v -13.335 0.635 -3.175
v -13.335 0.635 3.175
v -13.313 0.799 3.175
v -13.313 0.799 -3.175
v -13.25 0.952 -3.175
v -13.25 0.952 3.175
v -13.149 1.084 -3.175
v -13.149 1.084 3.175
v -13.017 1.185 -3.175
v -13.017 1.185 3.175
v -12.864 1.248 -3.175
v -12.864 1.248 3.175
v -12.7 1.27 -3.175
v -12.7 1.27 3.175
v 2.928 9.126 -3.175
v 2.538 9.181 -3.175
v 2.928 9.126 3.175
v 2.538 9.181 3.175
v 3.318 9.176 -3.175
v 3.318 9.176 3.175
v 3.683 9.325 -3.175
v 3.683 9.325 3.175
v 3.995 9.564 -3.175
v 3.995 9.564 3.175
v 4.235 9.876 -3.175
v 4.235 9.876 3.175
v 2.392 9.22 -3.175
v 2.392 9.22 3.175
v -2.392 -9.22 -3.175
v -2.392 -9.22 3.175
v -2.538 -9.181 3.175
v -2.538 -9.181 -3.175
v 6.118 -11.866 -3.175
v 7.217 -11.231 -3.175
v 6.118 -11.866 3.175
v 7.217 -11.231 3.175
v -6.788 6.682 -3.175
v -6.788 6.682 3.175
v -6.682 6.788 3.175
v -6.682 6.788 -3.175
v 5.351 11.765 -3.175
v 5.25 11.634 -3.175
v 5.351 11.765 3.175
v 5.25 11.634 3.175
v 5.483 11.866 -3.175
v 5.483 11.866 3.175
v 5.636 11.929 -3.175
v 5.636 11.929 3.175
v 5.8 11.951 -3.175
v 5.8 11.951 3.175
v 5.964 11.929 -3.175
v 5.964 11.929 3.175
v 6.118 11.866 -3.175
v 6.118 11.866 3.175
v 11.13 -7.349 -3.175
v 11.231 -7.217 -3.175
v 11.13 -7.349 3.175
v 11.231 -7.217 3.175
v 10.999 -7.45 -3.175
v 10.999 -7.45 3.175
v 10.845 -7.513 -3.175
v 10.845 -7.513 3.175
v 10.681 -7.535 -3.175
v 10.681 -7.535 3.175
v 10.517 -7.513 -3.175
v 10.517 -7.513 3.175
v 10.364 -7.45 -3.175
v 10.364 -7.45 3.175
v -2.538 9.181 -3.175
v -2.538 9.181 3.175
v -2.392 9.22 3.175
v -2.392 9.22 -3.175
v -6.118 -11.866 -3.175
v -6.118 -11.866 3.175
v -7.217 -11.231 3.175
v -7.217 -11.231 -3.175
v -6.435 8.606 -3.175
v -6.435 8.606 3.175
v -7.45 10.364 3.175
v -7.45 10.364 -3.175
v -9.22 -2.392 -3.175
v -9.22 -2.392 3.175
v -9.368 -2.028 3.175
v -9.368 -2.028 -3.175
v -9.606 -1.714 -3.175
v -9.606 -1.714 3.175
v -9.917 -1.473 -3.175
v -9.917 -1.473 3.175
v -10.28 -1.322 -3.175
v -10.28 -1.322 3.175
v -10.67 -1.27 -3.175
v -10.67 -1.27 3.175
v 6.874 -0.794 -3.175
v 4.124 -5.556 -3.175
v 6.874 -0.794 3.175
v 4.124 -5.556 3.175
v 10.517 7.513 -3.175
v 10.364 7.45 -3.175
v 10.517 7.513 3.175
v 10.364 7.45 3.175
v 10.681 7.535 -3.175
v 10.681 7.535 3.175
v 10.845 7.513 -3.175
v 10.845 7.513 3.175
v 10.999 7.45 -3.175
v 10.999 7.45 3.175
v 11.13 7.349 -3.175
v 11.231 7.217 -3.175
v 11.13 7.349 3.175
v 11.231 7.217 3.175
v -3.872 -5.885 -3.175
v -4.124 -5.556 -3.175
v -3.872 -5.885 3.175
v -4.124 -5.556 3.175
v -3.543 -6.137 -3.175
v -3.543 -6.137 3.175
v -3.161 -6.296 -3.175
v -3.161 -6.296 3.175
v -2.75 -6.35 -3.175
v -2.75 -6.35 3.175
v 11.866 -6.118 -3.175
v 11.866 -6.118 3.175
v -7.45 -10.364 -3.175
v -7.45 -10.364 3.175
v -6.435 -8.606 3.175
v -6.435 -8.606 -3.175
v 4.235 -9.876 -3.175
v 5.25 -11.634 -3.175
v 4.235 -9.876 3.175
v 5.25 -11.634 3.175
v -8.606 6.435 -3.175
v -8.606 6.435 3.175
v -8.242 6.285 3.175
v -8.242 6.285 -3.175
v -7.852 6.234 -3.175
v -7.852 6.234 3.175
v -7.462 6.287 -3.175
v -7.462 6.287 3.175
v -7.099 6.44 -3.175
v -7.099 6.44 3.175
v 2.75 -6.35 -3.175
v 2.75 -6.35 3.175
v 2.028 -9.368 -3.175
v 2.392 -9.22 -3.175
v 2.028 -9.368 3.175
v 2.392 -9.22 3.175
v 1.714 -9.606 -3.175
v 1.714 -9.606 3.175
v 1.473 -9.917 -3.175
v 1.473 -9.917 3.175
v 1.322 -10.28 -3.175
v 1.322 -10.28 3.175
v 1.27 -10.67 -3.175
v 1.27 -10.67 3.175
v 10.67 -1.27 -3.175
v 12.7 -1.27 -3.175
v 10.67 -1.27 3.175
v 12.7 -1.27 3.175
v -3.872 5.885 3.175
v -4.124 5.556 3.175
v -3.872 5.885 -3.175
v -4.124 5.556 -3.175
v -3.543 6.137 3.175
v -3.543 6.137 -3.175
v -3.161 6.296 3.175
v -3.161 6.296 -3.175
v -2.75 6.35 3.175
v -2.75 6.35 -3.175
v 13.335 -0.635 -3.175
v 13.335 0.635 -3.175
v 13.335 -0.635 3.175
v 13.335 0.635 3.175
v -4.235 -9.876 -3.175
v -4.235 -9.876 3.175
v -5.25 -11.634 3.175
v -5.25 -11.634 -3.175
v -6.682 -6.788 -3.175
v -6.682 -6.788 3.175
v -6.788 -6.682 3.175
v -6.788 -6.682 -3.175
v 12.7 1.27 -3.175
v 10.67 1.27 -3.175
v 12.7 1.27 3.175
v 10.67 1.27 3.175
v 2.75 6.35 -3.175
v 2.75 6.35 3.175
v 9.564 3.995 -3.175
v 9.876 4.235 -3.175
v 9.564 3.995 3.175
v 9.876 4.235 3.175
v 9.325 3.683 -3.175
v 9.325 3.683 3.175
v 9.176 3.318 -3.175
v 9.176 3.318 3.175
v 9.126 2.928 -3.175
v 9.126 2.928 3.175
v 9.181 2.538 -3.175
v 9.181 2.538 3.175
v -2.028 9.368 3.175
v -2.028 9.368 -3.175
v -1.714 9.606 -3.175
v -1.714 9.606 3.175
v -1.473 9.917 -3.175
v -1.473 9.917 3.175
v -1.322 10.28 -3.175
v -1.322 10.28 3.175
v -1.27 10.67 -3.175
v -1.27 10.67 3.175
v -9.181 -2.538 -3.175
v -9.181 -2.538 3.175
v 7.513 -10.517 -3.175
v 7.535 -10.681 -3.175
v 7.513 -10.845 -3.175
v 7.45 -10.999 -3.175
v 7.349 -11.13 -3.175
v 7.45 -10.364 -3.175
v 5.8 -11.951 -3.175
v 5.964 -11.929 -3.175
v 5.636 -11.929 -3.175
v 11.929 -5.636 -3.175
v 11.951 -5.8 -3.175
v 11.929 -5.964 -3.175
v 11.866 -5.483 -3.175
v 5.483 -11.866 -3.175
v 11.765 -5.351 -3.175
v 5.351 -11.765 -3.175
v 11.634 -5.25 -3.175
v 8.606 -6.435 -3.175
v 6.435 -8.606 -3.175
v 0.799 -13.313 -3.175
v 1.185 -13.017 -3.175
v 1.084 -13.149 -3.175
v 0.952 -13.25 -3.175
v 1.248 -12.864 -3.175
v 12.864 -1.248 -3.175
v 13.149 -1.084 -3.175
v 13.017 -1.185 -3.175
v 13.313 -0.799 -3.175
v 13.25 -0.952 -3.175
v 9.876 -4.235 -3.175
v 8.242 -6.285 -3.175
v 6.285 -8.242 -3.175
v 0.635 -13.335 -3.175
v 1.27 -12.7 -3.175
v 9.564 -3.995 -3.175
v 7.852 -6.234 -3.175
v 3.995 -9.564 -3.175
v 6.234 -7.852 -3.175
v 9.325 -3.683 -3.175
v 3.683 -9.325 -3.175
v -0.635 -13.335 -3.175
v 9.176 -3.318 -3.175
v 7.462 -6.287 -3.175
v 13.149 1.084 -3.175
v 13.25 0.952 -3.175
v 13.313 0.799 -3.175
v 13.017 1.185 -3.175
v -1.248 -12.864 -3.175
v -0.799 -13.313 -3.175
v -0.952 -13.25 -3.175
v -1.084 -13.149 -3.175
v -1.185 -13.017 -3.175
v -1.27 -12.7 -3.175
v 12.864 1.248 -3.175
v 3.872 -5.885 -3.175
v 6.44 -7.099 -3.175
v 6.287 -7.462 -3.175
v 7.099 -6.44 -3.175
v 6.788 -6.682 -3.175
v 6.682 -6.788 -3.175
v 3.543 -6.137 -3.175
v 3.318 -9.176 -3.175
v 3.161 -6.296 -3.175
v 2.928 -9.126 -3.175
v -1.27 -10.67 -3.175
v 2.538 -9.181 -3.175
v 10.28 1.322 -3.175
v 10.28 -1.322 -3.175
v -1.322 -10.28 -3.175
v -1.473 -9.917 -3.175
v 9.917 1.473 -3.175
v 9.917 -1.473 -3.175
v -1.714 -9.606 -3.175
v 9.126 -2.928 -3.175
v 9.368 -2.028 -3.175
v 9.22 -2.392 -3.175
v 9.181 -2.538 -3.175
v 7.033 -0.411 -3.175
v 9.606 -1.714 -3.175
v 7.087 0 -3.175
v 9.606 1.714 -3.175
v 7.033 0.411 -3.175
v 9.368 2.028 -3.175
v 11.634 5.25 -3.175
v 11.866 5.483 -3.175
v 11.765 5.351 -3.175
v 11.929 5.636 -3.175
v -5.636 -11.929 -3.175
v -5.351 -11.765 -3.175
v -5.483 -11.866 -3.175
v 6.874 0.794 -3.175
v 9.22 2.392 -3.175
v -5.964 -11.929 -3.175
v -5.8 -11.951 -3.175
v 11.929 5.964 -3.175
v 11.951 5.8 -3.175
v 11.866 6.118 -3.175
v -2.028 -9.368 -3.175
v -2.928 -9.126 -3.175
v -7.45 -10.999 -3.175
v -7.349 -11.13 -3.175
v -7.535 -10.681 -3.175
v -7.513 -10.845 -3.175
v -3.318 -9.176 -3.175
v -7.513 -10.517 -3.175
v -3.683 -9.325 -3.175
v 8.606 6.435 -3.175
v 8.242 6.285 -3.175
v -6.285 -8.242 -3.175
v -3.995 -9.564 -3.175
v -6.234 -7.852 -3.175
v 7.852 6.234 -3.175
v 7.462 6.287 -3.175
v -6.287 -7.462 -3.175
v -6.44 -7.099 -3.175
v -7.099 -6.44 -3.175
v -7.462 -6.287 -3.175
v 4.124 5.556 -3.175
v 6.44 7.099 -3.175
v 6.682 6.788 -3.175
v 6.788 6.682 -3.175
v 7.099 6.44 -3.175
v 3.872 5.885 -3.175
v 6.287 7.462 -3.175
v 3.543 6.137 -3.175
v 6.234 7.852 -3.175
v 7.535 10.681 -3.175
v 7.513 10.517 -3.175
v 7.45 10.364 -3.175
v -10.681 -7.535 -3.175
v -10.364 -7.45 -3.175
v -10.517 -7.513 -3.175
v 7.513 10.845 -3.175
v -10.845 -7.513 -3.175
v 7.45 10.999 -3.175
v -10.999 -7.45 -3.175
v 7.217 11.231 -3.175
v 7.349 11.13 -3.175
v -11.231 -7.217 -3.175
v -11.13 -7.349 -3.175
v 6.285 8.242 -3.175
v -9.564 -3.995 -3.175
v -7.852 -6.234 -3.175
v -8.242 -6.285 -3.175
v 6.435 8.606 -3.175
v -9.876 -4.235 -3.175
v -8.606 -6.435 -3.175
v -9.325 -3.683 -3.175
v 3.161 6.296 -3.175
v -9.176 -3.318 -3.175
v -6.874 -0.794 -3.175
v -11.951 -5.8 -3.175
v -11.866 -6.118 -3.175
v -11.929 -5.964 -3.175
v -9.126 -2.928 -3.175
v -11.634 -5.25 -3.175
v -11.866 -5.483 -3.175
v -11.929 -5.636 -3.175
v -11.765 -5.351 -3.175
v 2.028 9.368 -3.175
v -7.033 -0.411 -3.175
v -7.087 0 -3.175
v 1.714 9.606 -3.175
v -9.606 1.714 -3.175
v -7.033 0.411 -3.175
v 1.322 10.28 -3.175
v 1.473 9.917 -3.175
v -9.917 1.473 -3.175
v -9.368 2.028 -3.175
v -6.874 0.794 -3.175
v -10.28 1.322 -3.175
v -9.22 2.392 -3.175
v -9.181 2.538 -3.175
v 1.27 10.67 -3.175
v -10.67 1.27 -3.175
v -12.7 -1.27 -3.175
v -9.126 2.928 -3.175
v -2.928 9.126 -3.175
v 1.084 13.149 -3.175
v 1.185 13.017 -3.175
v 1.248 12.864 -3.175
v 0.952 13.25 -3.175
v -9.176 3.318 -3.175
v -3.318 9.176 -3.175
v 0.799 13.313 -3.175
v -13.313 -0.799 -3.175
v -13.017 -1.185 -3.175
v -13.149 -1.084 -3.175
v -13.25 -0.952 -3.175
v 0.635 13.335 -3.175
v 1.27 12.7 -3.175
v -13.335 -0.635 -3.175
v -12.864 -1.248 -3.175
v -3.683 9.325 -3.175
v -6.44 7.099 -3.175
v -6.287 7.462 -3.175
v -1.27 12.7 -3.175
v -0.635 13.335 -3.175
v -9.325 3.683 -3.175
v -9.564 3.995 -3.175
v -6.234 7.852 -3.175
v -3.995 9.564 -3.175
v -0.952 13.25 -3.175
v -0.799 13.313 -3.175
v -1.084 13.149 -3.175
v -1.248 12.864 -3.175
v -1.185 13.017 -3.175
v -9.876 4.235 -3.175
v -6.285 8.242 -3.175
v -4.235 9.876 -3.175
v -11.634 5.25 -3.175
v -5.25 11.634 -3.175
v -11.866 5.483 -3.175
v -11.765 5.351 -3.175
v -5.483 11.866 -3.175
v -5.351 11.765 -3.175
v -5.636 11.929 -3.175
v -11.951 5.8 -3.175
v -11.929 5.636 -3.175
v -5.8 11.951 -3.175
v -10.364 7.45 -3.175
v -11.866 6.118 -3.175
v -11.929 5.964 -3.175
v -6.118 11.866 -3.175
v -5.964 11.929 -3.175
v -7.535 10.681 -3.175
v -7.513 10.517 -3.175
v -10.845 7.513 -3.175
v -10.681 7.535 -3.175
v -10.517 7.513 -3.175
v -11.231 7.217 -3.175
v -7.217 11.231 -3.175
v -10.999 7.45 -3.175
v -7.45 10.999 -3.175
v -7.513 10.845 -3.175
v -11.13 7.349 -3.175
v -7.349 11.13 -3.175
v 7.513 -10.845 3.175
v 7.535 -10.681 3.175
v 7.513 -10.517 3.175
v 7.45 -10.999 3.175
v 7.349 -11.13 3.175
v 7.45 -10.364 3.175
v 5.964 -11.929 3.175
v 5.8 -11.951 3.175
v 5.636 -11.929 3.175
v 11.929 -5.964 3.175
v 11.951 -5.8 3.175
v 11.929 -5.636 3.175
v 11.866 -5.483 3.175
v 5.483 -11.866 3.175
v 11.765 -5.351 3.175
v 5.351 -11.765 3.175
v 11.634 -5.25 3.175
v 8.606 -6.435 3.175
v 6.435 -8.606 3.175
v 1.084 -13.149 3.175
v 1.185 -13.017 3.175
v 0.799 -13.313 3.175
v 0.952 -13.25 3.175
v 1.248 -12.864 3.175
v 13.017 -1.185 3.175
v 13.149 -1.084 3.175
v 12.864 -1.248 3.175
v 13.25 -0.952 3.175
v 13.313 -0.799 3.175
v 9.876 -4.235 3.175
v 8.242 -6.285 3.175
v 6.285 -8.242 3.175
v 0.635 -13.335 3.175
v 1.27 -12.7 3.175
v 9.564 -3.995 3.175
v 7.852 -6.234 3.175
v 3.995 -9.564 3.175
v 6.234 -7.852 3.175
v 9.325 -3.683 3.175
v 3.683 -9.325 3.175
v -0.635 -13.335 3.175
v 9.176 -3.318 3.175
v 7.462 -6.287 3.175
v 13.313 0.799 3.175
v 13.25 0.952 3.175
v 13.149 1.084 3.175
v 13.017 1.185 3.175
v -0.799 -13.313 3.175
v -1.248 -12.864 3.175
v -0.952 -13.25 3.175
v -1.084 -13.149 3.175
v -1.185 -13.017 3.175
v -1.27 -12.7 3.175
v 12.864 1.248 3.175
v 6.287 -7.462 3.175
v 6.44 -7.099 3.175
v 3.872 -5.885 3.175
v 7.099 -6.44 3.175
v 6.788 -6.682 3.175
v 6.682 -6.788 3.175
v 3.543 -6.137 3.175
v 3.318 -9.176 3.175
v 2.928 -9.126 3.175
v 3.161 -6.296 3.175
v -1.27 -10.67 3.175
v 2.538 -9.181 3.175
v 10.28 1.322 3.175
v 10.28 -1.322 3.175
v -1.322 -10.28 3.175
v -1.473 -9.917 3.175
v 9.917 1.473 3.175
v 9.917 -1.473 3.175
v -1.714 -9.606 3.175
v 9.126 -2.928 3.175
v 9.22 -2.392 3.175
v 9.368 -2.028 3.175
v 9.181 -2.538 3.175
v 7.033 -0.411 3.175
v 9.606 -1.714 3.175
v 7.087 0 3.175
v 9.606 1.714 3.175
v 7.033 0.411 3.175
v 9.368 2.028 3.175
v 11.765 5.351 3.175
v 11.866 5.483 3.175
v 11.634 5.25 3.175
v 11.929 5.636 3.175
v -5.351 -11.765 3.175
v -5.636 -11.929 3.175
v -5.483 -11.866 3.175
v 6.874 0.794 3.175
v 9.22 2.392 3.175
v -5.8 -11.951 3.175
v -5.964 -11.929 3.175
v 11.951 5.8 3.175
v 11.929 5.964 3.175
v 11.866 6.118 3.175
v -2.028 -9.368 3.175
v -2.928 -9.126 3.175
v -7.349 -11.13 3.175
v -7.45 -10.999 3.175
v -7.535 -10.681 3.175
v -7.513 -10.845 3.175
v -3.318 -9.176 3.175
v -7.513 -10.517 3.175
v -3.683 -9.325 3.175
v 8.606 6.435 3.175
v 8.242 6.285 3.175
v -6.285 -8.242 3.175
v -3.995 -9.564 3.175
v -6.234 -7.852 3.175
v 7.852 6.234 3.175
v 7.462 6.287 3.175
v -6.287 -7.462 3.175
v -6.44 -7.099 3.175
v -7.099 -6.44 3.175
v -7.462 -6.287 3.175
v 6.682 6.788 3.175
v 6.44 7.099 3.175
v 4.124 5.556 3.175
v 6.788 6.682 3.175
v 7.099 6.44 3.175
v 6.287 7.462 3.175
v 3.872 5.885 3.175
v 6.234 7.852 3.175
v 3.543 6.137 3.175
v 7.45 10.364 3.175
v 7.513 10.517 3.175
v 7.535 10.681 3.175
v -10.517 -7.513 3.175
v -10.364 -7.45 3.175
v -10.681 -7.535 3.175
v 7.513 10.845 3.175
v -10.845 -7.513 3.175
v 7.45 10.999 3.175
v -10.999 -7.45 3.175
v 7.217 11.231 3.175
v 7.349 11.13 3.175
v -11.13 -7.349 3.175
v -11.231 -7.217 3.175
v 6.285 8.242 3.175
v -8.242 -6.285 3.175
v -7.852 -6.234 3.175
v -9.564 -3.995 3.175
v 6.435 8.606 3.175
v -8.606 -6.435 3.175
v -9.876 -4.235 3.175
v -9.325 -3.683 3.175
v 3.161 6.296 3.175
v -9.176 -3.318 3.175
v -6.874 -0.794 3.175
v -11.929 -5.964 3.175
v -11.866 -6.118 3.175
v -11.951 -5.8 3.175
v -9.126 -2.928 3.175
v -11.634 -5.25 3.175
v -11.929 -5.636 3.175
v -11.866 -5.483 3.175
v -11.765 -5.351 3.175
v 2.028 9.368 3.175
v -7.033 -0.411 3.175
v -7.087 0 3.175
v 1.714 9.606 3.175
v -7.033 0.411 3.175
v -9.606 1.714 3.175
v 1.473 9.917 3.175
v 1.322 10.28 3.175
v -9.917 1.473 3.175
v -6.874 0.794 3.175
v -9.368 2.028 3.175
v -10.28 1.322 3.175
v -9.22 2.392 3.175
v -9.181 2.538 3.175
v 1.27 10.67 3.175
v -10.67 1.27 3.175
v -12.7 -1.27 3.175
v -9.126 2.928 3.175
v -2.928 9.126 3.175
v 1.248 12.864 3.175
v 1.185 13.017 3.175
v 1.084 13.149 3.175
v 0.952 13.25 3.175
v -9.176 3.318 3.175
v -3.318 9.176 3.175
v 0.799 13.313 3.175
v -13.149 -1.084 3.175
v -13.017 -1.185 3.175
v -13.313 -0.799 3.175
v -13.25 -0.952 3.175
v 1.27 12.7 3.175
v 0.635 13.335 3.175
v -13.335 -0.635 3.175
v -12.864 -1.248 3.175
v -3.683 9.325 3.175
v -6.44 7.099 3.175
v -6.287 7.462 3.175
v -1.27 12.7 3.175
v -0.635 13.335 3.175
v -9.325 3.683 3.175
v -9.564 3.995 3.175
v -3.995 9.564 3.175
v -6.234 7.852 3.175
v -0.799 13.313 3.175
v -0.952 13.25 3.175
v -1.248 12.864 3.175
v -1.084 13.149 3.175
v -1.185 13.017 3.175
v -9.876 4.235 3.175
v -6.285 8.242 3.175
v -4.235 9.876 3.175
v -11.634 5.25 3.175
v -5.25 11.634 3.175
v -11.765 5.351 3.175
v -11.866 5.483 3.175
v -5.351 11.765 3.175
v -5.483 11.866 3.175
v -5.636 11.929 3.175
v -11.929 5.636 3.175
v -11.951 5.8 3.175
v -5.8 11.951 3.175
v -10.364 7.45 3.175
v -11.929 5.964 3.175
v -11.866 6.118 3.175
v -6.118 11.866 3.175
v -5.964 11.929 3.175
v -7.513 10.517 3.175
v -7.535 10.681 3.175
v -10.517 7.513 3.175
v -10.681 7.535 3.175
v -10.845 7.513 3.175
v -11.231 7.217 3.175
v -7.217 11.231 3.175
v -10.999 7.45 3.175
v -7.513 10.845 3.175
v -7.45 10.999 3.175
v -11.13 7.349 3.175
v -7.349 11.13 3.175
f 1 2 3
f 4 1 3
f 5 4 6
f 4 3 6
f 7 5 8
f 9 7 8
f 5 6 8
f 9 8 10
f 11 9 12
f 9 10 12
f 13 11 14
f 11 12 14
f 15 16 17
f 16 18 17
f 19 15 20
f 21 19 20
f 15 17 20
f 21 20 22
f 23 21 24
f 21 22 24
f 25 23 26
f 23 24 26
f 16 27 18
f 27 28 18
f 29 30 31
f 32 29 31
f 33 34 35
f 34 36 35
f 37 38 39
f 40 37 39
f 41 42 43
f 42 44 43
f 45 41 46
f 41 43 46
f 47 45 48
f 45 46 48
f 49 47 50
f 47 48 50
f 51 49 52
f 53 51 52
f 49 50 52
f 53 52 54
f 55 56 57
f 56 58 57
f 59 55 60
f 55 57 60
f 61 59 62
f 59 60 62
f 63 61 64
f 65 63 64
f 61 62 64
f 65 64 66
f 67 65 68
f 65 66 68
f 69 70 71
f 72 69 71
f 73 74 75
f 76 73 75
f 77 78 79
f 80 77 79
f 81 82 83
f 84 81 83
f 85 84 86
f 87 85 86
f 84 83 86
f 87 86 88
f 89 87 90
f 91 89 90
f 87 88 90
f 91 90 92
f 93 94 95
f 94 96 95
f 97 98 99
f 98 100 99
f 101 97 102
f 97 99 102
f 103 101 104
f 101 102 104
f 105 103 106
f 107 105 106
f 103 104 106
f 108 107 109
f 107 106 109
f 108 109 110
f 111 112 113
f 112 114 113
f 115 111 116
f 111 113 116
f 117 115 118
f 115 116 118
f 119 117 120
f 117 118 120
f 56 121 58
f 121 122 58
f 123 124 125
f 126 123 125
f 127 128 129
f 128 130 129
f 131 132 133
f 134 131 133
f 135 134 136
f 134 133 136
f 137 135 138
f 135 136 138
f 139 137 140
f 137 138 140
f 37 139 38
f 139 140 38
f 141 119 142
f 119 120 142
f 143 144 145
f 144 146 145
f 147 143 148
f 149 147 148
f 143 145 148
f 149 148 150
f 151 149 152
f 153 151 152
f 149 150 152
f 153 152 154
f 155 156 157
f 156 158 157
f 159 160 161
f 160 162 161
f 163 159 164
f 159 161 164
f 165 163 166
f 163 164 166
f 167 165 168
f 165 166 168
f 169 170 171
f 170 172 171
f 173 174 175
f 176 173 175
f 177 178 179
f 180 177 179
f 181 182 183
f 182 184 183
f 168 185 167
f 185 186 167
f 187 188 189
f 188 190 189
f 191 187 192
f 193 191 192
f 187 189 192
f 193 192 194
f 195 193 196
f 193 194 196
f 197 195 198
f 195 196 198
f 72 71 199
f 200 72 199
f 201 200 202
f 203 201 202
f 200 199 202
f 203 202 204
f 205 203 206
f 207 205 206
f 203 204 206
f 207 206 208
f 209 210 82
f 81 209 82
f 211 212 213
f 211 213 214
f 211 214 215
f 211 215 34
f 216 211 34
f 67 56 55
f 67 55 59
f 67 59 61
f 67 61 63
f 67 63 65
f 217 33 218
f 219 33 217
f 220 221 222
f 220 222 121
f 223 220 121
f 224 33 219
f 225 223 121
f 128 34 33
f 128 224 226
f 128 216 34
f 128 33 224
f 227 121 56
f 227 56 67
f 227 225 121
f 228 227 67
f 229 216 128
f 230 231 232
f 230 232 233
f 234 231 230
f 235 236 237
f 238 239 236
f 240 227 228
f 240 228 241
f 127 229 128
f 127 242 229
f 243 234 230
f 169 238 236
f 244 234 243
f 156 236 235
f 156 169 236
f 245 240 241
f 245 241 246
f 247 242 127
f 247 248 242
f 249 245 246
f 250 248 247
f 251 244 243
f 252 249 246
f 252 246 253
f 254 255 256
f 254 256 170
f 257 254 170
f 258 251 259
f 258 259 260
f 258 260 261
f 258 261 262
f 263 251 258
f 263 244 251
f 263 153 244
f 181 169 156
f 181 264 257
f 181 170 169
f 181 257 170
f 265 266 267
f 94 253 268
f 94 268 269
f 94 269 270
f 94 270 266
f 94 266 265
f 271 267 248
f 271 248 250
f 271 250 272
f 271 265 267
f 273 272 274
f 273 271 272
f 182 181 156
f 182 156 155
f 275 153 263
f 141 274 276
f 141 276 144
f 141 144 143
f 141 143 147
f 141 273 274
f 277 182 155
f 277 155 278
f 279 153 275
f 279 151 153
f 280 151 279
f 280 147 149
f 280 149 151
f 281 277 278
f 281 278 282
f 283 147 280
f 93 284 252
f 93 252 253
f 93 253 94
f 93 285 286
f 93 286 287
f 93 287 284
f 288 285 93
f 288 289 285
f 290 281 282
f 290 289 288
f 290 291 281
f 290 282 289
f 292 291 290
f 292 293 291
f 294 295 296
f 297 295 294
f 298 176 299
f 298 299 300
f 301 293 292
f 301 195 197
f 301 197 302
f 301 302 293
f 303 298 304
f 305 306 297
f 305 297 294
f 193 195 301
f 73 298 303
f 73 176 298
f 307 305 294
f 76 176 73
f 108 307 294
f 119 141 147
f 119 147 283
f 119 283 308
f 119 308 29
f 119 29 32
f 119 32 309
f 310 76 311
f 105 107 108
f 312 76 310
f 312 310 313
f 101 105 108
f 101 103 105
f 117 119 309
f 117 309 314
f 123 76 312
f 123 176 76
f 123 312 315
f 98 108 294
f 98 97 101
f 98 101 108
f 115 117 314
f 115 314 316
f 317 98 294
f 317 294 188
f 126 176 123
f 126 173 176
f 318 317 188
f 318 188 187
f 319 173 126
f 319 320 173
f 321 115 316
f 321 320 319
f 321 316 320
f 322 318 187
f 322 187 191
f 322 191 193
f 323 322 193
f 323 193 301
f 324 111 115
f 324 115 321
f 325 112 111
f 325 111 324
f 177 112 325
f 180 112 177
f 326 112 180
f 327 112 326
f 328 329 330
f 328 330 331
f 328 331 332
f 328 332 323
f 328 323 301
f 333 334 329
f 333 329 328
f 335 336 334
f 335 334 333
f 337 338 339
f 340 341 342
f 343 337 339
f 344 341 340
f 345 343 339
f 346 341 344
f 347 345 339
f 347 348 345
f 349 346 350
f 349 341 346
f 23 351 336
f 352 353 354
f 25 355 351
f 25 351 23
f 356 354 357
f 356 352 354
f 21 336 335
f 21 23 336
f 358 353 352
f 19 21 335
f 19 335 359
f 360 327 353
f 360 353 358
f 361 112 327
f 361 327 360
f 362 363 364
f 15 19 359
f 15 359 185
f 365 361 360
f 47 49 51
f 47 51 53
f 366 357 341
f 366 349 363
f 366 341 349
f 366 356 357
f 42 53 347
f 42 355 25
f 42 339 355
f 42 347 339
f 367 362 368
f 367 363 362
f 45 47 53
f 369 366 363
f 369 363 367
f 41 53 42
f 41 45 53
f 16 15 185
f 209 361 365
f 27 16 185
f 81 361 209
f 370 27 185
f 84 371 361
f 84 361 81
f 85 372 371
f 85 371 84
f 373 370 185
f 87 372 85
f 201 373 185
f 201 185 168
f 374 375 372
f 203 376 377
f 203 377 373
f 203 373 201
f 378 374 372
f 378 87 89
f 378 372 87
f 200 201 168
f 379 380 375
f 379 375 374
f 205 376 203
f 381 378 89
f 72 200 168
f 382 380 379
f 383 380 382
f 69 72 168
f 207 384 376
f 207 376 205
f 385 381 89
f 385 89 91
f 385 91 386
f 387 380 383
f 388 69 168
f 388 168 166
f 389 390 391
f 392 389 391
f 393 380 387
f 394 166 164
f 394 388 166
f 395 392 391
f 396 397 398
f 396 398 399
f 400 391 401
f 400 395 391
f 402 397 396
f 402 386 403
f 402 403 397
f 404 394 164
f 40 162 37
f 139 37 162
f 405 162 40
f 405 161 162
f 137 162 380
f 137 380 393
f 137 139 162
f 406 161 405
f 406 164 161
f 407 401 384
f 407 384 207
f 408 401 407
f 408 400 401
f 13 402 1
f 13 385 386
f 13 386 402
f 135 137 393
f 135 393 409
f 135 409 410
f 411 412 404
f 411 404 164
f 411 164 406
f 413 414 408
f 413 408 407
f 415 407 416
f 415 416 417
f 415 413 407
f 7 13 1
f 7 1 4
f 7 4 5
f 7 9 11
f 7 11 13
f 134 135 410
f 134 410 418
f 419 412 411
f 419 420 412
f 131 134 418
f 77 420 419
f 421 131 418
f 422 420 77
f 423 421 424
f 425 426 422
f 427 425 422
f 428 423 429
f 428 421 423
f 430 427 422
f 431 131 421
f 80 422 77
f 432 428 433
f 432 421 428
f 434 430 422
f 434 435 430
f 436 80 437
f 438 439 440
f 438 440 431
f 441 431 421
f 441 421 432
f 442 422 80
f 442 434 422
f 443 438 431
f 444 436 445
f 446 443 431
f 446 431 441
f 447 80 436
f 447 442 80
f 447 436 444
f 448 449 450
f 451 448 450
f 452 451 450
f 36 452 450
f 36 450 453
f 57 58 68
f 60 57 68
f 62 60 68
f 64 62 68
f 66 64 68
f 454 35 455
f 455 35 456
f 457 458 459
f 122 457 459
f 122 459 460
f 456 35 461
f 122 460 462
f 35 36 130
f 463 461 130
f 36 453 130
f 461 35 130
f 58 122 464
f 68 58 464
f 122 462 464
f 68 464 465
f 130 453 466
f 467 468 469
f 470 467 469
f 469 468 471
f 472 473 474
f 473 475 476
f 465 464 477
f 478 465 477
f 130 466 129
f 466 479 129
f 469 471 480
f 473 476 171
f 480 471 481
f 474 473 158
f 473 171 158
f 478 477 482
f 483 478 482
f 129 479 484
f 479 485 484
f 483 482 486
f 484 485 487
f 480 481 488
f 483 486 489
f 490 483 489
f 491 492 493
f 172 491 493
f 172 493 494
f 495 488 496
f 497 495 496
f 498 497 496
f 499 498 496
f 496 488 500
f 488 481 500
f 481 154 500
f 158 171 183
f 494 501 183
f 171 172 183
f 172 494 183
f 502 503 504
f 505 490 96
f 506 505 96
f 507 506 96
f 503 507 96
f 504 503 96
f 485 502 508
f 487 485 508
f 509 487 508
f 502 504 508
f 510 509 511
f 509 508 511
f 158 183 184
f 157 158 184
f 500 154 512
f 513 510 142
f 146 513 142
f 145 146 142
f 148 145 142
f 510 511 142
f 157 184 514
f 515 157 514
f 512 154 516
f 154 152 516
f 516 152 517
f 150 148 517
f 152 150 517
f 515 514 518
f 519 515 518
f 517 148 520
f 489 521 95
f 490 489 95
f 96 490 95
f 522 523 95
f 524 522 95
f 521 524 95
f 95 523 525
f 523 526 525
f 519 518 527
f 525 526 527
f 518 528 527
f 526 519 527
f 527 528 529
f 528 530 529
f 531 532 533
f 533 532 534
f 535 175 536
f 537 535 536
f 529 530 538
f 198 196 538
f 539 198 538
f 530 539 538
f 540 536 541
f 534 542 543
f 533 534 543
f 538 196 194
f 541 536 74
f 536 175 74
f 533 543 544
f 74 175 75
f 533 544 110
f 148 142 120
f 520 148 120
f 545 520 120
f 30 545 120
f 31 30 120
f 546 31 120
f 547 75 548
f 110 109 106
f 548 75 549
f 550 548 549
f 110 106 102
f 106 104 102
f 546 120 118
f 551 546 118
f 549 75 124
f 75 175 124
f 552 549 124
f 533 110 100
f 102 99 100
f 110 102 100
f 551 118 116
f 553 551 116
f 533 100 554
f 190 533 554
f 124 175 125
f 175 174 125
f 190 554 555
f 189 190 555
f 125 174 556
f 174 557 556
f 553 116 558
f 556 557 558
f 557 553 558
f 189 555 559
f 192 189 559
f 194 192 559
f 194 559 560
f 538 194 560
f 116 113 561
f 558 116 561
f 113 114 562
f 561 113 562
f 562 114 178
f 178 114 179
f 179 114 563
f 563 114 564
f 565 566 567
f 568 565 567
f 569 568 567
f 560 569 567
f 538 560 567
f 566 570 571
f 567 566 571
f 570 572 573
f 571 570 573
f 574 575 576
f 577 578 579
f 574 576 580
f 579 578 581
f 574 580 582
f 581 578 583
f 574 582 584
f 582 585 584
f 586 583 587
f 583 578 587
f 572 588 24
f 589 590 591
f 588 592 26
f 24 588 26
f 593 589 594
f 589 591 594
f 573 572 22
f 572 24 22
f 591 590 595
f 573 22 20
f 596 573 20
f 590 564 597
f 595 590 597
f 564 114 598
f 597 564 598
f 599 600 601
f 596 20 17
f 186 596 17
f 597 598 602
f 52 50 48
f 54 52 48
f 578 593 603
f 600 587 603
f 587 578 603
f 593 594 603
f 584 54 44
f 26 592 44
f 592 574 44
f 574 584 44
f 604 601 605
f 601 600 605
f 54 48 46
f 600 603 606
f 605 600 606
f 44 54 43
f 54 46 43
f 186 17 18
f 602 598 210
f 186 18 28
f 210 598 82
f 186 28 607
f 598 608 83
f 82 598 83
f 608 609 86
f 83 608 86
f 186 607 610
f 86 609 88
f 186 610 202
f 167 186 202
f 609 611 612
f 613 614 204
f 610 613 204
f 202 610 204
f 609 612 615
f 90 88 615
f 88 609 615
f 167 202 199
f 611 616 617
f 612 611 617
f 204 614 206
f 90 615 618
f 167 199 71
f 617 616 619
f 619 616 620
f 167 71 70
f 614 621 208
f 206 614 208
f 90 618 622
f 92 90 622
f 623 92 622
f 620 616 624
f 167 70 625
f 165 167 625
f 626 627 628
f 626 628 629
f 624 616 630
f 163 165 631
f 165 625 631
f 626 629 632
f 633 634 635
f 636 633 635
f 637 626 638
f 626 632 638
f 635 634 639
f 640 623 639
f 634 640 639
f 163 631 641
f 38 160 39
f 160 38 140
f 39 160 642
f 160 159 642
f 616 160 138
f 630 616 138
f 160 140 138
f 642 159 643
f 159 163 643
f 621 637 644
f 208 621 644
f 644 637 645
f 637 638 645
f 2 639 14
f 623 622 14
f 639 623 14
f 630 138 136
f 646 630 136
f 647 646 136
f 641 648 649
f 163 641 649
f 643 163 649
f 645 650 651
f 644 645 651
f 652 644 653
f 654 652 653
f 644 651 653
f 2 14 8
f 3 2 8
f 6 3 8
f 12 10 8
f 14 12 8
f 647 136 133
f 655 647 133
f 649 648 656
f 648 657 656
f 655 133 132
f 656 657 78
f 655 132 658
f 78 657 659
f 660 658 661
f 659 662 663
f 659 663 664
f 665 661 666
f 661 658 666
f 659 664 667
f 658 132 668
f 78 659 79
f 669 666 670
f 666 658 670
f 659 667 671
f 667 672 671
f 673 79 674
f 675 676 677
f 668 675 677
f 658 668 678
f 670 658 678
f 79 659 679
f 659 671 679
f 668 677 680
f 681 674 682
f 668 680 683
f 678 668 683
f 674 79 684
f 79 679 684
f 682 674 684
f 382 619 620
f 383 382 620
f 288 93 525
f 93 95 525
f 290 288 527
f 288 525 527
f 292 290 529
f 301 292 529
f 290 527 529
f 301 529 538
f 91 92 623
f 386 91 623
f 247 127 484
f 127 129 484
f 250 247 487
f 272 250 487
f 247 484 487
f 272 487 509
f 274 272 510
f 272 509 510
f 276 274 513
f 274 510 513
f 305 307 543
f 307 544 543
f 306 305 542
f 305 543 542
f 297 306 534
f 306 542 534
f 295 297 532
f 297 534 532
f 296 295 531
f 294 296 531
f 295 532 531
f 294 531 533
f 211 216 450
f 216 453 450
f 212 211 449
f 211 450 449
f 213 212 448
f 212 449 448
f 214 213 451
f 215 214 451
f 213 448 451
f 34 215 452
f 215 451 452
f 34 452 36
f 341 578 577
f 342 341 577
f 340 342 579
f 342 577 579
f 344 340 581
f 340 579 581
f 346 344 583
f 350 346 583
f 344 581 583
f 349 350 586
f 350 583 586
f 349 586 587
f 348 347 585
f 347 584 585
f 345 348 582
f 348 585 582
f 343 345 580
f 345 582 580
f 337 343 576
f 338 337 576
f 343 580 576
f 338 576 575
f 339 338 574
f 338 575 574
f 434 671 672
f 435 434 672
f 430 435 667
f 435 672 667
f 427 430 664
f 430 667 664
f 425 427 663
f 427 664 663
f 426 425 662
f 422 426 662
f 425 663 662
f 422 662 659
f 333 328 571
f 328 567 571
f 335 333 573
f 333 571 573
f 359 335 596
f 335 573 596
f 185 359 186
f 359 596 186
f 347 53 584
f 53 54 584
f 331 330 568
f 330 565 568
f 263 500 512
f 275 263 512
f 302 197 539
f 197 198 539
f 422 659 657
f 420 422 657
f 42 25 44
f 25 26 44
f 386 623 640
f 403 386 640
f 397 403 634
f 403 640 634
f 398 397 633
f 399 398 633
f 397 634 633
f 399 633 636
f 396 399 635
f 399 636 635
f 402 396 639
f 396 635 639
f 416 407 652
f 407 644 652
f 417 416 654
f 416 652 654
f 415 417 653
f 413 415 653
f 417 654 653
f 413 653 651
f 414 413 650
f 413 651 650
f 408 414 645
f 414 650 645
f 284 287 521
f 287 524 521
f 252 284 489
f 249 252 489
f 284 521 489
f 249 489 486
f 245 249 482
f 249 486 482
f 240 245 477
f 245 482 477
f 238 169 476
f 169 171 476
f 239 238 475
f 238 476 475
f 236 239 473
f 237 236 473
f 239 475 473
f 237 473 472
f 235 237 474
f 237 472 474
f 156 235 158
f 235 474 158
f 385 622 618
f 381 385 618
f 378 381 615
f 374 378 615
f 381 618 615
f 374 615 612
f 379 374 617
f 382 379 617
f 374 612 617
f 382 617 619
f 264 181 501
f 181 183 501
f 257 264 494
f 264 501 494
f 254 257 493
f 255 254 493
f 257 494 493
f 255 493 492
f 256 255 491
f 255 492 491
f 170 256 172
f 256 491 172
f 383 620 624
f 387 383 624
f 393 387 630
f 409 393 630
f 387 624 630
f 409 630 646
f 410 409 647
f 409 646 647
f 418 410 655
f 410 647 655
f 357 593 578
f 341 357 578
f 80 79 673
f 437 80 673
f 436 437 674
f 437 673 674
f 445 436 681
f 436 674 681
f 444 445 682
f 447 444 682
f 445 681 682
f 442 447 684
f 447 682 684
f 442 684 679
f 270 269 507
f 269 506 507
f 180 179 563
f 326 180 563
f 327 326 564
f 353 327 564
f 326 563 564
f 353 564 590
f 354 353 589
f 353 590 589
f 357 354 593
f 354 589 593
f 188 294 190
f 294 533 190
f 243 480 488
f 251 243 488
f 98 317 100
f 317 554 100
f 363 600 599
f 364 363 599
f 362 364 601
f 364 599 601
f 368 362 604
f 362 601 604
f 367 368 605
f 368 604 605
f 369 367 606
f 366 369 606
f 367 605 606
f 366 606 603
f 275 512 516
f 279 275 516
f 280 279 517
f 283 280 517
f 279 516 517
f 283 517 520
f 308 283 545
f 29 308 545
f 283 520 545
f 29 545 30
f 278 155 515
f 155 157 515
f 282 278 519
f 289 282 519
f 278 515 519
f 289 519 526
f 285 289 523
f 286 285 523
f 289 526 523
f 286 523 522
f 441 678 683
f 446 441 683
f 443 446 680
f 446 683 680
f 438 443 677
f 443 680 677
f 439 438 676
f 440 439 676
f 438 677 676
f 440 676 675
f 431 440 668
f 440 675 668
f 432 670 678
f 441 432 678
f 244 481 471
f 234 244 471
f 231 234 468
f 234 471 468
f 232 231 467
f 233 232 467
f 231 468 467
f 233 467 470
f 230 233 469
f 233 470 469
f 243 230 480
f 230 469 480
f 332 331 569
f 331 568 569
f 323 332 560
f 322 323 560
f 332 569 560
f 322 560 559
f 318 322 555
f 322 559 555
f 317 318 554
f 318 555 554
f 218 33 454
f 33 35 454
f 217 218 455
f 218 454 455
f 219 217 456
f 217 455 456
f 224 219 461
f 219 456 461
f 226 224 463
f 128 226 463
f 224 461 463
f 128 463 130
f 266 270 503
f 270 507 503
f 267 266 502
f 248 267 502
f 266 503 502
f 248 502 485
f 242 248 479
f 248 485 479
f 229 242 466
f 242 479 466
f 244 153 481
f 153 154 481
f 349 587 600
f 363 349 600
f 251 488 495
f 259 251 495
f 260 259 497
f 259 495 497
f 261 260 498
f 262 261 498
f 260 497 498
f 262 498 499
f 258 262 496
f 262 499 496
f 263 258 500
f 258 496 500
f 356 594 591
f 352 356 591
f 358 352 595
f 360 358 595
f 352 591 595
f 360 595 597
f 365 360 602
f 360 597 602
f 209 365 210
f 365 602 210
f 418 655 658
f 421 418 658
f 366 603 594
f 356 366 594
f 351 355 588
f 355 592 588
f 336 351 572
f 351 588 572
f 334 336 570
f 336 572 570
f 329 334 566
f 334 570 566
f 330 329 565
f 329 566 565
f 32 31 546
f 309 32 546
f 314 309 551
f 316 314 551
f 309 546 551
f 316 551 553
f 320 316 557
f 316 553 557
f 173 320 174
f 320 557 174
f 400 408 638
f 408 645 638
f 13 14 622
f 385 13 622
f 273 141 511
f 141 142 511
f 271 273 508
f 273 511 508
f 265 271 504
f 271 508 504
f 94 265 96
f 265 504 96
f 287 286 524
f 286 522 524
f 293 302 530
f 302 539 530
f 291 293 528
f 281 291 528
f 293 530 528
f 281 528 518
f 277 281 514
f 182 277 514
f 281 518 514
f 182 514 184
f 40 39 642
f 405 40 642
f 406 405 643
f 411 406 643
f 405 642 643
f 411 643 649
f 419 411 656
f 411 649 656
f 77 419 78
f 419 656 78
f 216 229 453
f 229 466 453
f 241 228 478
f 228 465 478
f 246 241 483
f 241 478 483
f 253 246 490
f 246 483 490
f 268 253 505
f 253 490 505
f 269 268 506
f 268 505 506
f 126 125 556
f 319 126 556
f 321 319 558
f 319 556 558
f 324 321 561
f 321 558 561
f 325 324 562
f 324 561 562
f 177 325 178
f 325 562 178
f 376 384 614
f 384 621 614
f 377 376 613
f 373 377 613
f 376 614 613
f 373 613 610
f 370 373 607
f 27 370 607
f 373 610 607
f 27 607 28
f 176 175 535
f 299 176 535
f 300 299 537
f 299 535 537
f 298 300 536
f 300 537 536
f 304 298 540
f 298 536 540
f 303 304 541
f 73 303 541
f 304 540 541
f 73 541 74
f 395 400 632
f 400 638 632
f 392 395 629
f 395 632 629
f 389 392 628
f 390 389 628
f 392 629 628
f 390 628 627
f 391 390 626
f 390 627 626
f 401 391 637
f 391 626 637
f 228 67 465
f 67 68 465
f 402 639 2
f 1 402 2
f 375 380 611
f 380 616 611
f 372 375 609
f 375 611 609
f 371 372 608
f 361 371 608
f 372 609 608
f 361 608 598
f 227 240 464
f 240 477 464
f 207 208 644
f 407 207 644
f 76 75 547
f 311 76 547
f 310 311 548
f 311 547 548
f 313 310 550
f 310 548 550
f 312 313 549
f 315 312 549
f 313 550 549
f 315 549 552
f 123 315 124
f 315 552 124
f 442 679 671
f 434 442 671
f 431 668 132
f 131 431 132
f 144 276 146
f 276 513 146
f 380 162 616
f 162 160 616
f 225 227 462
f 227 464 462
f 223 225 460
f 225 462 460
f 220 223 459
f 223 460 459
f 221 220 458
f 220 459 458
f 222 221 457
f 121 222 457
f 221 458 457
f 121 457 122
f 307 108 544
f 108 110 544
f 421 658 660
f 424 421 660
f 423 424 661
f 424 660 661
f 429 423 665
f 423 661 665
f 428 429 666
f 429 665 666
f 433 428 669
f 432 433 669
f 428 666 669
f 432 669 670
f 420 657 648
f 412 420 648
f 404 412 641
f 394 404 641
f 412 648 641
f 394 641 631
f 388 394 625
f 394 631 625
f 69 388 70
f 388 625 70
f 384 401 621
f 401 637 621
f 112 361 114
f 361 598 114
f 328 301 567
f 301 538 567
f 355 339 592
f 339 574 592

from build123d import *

# Parameters (mm, degrees)
BOSS_EXTRUDE1_DEPTH = 3.175
FILLET1_R           = 1.5875


with BuildPart() as part:
    # Sketch1 → Boss-Extrude1 (new, symmetric)
    with BuildSketch(Plane.XY):
        with BuildLine():
            Line((-1.27, 10.670267616), (-1.27, 12.7))
            ThreePointArc((-1.27, 12.7), (-1.084012806, 13.149012806), (-0.635, 13.335))
            Line((-0.635, 13.335), (0.635, 13.335))
            ThreePointArc((0.635, 13.335), (1.084012806, 13.149012806), (1.27, 12.7))
            Line((1.27, 12.7), (1.27, 10.670267616))
            ThreePointArc((1.27, 10.670267616), (1.583306834, 9.753271395), (2.392223502, 9.219701281))
            Line((2.392223502, 9.219701281), (2.538124316, 9.180607276))
            ThreePointArc((2.538124316, 9.180607276), (3.505451757, 9.238234215), (4.235281545, 9.875722821))
            Line((4.235281545, 9.875722821), (5.250147737, 11.633522628))
            ThreePointArc((5.250147737, 11.633522628), (5.635723775, 11.929385528), (6.117573869, 11.865948759))
            Line((6.117573869, 11.865948759), (7.217426131, 11.230948759))
            ThreePointArc((7.217426131, 11.230948759), (7.513289031, 10.845372722), (7.449852263, 10.363522628))
            Line((7.449852263, 10.363522628), (6.434986071, 8.605722821))
            ThreePointArc((6.434986071, 8.605722821), (6.247819637, 7.654927381), (6.681576965, 6.788383774))
            Line((6.681576965, 6.788383774), (6.788383774, 6.681576965))
            ThreePointArc((6.788383774, 6.681576965), (7.654927381, 6.247819637), (8.605722821, 6.434986071))
            Line((8.605722821, 6.434986071), (10.363522628, 7.449852263))
            ThreePointArc((10.363522628, 7.449852263), (10.845372722, 7.513289031), (11.230948759, 7.217426131))
            Line((11.230948759, 7.217426131), (11.865948759, 6.117573869))
            ThreePointArc((11.865948759, 6.117573869), (11.929385528, 5.635723775), (11.633522628, 5.250147737))
            Line((11.633522628, 5.250147737), (9.875722821, 4.235281545))
            ThreePointArc((9.875722821, 4.235281545), (9.238234215, 3.505451757), (9.180607276, 2.538124316))
            Line((9.180607276, 2.538124316), (9.219701281, 2.392223502))
            ThreePointArc((9.219701281, 2.392223502), (9.753271395, 1.583306834), (10.670267616, 1.27))
            Line((10.670267616, 1.27), (12.7, 1.27))
            ThreePointArc((12.7, 1.27), (13.149012806, 1.084012806), (13.335, 0.635))
            Line((13.335, 0.635), (13.335, -0.635))
            ThreePointArc((13.335, -0.635), (13.149012806, -1.084012806), (12.7, -1.27))
            Line((12.7, -1.27), (10.670267616, -1.27))
            ThreePointArc((10.670267616, -1.27), (9.753271395, -1.583306834), (9.219701281, -2.392223502))
            Line((9.219701281, -2.392223502), (9.180607276, -2.538124316))
            ThreePointArc((9.180607276, -2.538124316), (9.238234215, -3.505451757), (9.875722821, -4.235281545))
            Line((9.875722821, -4.235281545), (11.633522628, -5.250147737))
            ThreePointArc((11.633522628, -5.250147737), (11.929385528, -5.635723775), (11.865948759, -6.117573869))
            Line((11.865948759, -6.117573869), (11.230948759, -7.217426131))
            ThreePointArc((11.230948759, -7.217426131), (10.845372722, -7.513289031), (10.363522628, -7.449852263))
            Line((10.363522628, -7.449852263), (8.605722821, -6.434986071))
            ThreePointArc((8.605722821, -6.434986071), (7.654927381, -6.247819637), (6.788383774, -6.681576965))
            Line((6.788383774, -6.681576965), (6.681576965, -6.788383774))
            ThreePointArc((6.681576965, -6.788383774), (6.247819637, -7.654927381), (6.434986071, -8.605722821))
            Line((6.434986071, -8.605722821), (7.449852263, -10.363522628))
            ThreePointArc((7.449852263, -10.363522628), (7.513289031, -10.845372722), (7.217426131, -11.230948759))
            Line((7.217426131, -11.230948759), (6.117573869, -11.865948759))
            ThreePointArc((6.117573869, -11.865948759), (5.635723775, -11.929385528), (5.250147737, -11.633522628))
            Line((5.250147737, -11.633522628), (4.235281545, -9.875722821))
            ThreePointArc((4.235281545, -9.875722821), (3.505451757, -9.238234215), (2.538124316, -9.180607276))
            Line((2.538124316, -9.180607276), (2.392223502, -9.219701281))
            ThreePointArc((2.392223502, -9.219701281), (1.583306834, -9.753271395), (1.27, -10.670267616))
            Line((1.27, -10.670267616), (1.27, -12.7))
            ThreePointArc((1.27, -12.7), (1.084012806, -13.149012806), (0.635, -13.335))
            Line((0.635, -13.335), (-0.635, -13.335))
            ThreePointArc((-0.635, -13.335), (-1.084012806, -13.149012806), (-1.27, -12.7))
            Line((-1.27, -12.7), (-1.27, -10.670267616))
            ThreePointArc((-1.27, -10.670267616), (-1.583306834, -9.753271395), (-2.392223502, -9.219701281))
            Line((-2.392223502, -9.219701281), (-2.538124316, -9.180607276))
            ThreePointArc((-2.538124316, -9.180607276), (-3.505451757, -9.238234215), (-4.235281545, -9.875722821))
            Line((-4.235281545, -9.875722821), (-5.250147737, -11.633522628))
            ThreePointArc((-5.250147737, -11.633522628), (-5.635723775, -11.929385528), (-6.117573869, -11.865948759))
            Line((-6.117573869, -11.865948759), (-7.217426131, -11.230948759))
            ThreePointArc((-7.217426131, -11.230948759), (-7.513289031, -10.845372722), (-7.449852263, -10.363522628))
            Line((-7.449852263, -10.363522628), (-6.434986071, -8.605722821))
            ThreePointArc((-6.434986071, -8.605722821), (-6.247819637, -7.654927381), (-6.681576965, -6.788383774))
            Line((-6.681576965, -6.788383774), (-6.788383774, -6.681576965))
            ThreePointArc((-6.788383774, -6.681576965), (-7.654927381, -6.247819637), (-8.605722821, -6.434986071))
            Line((-8.605722821, -6.434986071), (-10.363522628, -7.449852263))
            ThreePointArc((-10.363522628, -7.449852263), (-10.845372722, -7.513289031), (-11.230948759, -7.217426131))
            Line((-11.230948759, -7.217426131), (-11.865948759, -6.117573869))
            ThreePointArc((-11.865948759, -6.117573869), (-11.929385528, -5.635723775), (-11.633522628, -5.250147737))
            Line((-11.633522628, -5.250147737), (-9.875722821, -4.235281545))
            ThreePointArc((-9.875722821, -4.235281545), (-9.238234215, -3.505451757), (-9.180607276, -2.538124316))
            Line((-9.180607276, -2.538124316), (-9.219701281, -2.392223502))
            ThreePointArc((-9.219701281, -2.392223502), (-9.753271395, -1.583306834), (-10.670267616, -1.27))
            Line((-10.670267616, -1.27), (-12.7, -1.27))
            ThreePointArc((-12.7, -1.27), (-13.149012806, -1.084012806), (-13.335, -0.635))
            Line((-13.335, -0.635), (-13.335, 0.635))
            ThreePointArc((-13.335, 0.635), (-13.149012806, 1.084012806), (-12.7, 1.27))
            Line((-12.7, 1.27), (-10.670267616, 1.27))
            ThreePointArc((-10.670267616, 1.27), (-9.753271395, 1.583306834), (-9.219701281, 2.392223502))
            Line((-9.219701281, 2.392223502), (-9.180607276, 2.538124316))
            ThreePointArc((-9.180607276, 2.538124316), (-9.238234215, 3.505451757), (-9.875722821, 4.235281545))
            Line((-9.875722821, 4.235281545), (-11.633522628, 5.250147737))
            ThreePointArc((-11.633522628, 5.250147737), (-11.929385528, 5.635723775), (-11.865948759, 6.117573869))
            Line((-11.865948759, 6.117573869), (-11.230948759, 7.217426131))
            ThreePointArc((-11.230948759, 7.217426131), (-10.845372722, 7.513289031), (-10.363522628, 7.449852263))
            Line((-10.363522628, 7.449852263), (-8.605722821, 6.434986071))
            ThreePointArc((-8.605722821, 6.434986071), (-7.654927381, 6.247819637), (-6.788383774, 6.681576965))
            Line((-6.788383774, 6.681576965), (-6.681576965, 6.788383774))
            ThreePointArc((-6.681576965, 6.788383774), (-6.247819637, 7.654927381), (-6.434986071, 8.605722821))
            Line((-6.434986071, 8.605722821), (-7.449852263, 10.363522628))
            ThreePointArc((-7.449852263, 10.363522628), (-7.513289031, 10.845372722), (-7.217426131, 11.230948759))
            Line((-7.217426131, 11.230948759), (-6.117573869, 11.865948759))
            ThreePointArc((-6.117573869, 11.865948759), (-5.635723775, 11.929385528), (-5.250147737, 11.633522628))
            Line((-5.250147737, 11.633522628), (-4.235281545, 9.875722821))
            ThreePointArc((-4.235281545, 9.875722821), (-3.505451757, 9.238234215), (-2.538124316, 9.180607276))
            Line((-2.538124316, 9.180607276), (-2.392223502, 9.219701281))
            ThreePointArc((-2.392223502, 9.219701281), (-1.583306834, 9.753271395), (-1.27, 10.670267616))
        make_face()
        Polygon((-3.666174209, 6.35), (-7.332348419, 0), (-3.666174209, -6.35), (3.666174209, -6.35), (7.332348419, 0), (3.666174209, 6.35), align=None, mode=Mode.SUBTRACT)
    extrude(amount=BOSS_EXTRUDE1_DEPTH, both=True)

    # Fillet1
    fillet1_edges = [part.edges().sort_by_distance(p)[0] for p in [
        (-3.666174209, 6.35, 0),
        (-7.332348419, 0, 0),
        (-3.666174209, -6.35, 0),
        (3.666174209, -6.35, 0),
        (7.332348419, 0, 0),
        (3.666174209, 6.35, 0),
    ]]
    fillet(fillet1_edges, radius=FILLET1_R)


solid = part.part
